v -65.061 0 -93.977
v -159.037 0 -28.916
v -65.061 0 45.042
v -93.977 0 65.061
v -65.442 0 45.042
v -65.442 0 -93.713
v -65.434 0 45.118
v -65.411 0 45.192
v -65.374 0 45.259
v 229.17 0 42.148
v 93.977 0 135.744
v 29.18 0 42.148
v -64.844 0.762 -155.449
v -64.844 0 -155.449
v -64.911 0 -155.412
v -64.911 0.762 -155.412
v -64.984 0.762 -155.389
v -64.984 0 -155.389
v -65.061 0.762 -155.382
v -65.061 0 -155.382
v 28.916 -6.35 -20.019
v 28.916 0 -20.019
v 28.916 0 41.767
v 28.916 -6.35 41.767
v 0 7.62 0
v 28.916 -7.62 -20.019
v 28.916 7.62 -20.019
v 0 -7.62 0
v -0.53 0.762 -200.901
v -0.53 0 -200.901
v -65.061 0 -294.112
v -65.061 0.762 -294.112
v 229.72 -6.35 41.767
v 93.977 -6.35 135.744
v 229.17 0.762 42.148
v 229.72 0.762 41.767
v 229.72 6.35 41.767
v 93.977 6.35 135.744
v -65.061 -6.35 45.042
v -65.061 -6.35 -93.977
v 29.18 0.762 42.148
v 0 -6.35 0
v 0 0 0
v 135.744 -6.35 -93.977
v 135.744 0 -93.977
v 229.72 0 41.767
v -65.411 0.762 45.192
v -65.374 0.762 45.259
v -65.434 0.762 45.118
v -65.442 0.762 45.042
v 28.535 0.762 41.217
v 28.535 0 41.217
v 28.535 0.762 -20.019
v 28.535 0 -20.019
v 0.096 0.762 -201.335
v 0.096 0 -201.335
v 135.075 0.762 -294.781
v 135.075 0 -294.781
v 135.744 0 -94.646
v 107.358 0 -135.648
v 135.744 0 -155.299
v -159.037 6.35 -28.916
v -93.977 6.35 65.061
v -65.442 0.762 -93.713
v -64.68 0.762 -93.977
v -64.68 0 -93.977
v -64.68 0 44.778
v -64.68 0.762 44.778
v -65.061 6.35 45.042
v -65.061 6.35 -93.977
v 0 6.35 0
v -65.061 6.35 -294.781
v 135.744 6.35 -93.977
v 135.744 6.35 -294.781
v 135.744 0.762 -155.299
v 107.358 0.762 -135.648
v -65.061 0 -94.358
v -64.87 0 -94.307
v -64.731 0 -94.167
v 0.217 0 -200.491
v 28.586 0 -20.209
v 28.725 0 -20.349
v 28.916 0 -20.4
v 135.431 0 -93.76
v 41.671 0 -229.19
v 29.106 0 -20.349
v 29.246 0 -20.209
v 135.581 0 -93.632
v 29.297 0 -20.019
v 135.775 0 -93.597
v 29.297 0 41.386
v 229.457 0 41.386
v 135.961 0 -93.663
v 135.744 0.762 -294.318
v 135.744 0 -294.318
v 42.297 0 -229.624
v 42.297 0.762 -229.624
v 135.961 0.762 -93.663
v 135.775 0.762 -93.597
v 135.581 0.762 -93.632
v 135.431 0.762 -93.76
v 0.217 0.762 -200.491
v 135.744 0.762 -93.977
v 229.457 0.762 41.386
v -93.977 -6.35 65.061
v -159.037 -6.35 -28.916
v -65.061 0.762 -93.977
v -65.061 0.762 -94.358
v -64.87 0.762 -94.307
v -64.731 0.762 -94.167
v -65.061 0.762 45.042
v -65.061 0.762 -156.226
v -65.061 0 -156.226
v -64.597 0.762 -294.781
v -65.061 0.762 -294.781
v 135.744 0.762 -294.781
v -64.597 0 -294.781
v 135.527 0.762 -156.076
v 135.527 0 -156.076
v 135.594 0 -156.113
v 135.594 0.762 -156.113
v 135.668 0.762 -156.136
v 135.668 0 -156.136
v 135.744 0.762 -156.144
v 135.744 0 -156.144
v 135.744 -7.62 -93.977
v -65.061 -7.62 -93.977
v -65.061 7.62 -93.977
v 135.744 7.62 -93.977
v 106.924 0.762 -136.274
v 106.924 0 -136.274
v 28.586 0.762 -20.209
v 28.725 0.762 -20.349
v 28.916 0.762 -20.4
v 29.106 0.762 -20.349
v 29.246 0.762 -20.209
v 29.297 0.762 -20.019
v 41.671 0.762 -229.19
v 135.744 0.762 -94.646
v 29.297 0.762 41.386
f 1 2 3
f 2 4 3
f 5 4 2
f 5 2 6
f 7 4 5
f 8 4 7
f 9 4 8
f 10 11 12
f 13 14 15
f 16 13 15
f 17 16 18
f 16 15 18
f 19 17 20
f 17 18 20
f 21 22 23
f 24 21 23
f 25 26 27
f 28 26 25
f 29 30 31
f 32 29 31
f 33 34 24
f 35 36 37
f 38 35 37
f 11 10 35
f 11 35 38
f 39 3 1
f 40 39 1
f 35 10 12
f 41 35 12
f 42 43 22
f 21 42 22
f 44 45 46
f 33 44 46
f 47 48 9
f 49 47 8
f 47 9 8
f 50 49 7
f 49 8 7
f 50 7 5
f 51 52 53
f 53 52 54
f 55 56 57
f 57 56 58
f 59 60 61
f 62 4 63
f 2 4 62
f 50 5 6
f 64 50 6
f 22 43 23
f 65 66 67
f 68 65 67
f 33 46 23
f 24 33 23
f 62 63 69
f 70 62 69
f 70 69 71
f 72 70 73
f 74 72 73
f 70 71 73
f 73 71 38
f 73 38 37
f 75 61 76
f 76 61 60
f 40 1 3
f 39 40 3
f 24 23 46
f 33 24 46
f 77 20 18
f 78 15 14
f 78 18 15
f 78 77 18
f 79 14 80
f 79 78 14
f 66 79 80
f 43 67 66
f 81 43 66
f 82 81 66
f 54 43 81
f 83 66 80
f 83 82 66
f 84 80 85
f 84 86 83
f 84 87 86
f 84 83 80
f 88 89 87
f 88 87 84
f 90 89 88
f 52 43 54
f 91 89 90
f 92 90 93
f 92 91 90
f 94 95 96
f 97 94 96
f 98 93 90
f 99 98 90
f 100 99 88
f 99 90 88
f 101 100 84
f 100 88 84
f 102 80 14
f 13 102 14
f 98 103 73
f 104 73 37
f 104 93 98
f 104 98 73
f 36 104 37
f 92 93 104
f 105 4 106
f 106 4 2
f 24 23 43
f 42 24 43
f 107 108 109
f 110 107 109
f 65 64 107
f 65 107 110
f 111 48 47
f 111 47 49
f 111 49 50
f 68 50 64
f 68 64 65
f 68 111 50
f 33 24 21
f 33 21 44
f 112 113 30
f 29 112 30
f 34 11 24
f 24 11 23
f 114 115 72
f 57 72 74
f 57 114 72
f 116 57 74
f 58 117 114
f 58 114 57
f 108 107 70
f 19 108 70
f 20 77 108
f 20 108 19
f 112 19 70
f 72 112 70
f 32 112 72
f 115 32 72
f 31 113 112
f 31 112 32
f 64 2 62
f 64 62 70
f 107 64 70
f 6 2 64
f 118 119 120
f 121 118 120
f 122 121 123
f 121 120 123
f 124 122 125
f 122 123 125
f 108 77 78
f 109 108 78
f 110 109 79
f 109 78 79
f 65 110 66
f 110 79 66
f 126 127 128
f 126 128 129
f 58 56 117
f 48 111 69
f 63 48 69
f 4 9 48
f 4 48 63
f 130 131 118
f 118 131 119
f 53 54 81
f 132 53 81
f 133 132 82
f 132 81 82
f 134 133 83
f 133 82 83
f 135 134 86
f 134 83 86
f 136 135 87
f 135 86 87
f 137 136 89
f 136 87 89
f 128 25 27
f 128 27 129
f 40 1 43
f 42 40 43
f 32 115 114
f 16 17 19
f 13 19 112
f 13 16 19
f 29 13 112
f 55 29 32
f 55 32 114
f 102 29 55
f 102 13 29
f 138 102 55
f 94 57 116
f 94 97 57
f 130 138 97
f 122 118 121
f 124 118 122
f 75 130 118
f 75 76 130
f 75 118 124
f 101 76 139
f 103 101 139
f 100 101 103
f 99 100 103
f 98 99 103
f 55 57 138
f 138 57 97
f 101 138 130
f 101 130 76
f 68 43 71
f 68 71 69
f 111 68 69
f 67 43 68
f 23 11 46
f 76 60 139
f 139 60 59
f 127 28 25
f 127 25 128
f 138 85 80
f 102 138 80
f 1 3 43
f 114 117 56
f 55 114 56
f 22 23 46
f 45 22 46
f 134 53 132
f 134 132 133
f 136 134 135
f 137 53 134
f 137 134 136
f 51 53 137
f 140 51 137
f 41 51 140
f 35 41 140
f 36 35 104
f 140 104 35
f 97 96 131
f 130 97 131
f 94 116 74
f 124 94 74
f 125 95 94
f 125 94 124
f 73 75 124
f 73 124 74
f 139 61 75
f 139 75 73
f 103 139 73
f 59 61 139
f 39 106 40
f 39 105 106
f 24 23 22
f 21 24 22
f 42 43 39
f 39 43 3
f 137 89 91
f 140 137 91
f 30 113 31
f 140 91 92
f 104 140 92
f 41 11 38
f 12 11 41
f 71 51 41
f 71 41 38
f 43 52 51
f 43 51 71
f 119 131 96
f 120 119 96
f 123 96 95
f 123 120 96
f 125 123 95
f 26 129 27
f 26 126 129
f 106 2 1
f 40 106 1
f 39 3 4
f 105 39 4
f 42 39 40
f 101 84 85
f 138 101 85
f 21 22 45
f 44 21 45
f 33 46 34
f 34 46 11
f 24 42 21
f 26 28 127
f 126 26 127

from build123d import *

# Parameters (mm, degrees)
F1_DEPTH = 7.62
F2_DEPTH = 6.35
F3_DEPTH = 6.35
F4_DEPTH = 6.35
F6_DEPTH = 0.762


with BuildPart() as f1:
    # F0 (on Front) → F1 (new body, symmetric)
    with BuildSketch(Plane.XZ):
        Polygon((28.9158669246, -20.0186771016), (0, 0), (-65.0607005803, -93.9765675049), (135.7439308404, -93.9765675049), align=None)
    extrude(amount=F1_DEPTH, both=True)


with BuildPart() as f2:
    # F0 (on Front) → F2 (new body)
    with BuildSketch(Plane.XZ):
        Polygon((28.9158669246, 41.7673633355), (28.9158669246, -20.0186771016), (135.7439308404, -93.9765675049), (229.7204983453, 41.7673633355), align=None)
    extrude(amount=F2_DEPTH)


with BuildPart() as f2b:
    # F0 (on Front) → F2, piece 2 (new body)
    with BuildSketch(Plane.XZ):
        Polygon((-65.0607005803, -93.9765675049), (0, 0), (-65.0607005803, 45.0420234787), align=None)
    extrude(amount=F2_DEPTH)


with BuildPart() as f3:
    # F0 (on Front) → F3 (new body)
    with BuildSketch(Plane.XZ):
        Polygon((93.9765675049, 135.7439308404), (28.9158669246, 41.7673633355), (229.7204983453, 41.7673633355), align=None)
    extrude(amount=F3_DEPTH)


with BuildPart() as f3b:
    # F0 (on Front) → F3, piece 2 (new body)
    with BuildSketch(Plane.XZ):
        Polygon((-159.0372680852, -28.9158669246), (-65.0607005803, -93.9765675049), (-65.0607005803, 45.0420234787), (-93.9765675049, 65.0607005803), align=None)
    extrude(amount=F3_DEPTH)


with BuildPart() as f3c:
    # F0 (on Front) → F3, piece 3 (new body)
    with BuildSketch(Plane.XZ):
        Polygon((28.9158669246, 41.7673633355), (0, 0), (28.9158669246, -20.0186771016), align=None)
    extrude(amount=F3_DEPTH)


with BuildPart() as f4:
    # F0 (on Front) → F4 (new body)
    with BuildSketch(Plane.XZ):
        Polygon((28.9158669246, -20.0186771016), (0, 0), (-65.0607005803, -93.9765675049), (135.7439308404, -93.9765675049), align=None)
        Polygon((28.9158669246, 41.7673633355), (0, 0), (28.9158669246, -20.0186771016), align=None)
        Polygon((-65.0607005803, -93.9765675049), (0, 0), (-65.0607005803, 45.0420234787), align=None)
        Polygon((135.7439308404, -93.9765675049), (-65.0607005803, -93.9765675049), (-65.0607005803, -155.762607942), (0, -200.8046314207), (41.7673633355, -229.7204983453), (106.8280639158, -135.7439308404), align=None)
        Polygon((-159.0372680852, -28.9158669246), (-65.0607005803, -93.9765675049), (-65.0607005803, 45.0420234787), (-93.9765675049, 65.0607005803), align=None)
        Polygon((28.9158669246, 41.7673633355), (28.9158669246, -20.0186771016), (135.7439308404, -93.9765675049), (229.7204983453, 41.7673633355), align=None)
        Polygon((93.9765675049, 135.7439308404), (28.9158669246, 41.7673633355), (229.7204983453, 41.7673633355), align=None)
        Polygon((135.7439308404, -155.762607942), (135.7439308404, -93.9765675049), (106.8280639158, -135.7439308404), align=None)
        Polygon((0, -200.8046314207), (-65.0607005803, -155.762607942), (-65.0607005803, -294.7811989256), align=None)
        Polygon((135.7439308404, -294.7811989256), (135.7439308404, -155.762607942), (106.8280639158, -135.7439308404), (41.7673633355, -229.7204983453), align=None)
        Polygon((0, -200.8046314207), (-65.0607005803, -294.7811989256), (135.7439308404, -294.7811989256), (41.7673633355, -229.7204983453), align=None)
    extrude(amount=-F4_DEPTH)

    # F5 (on face) → F6 (cut)
    with BuildSketch(Plane.XZ):
        with BuildLine():
            ThreePointArc((-64.8438315784, -155.449352717), (-65.3739558053, -155.5457389401), (-65.2775695822, -156.075863167))
            Line((-65.2775695822, -156.075863167), (-0.530124227, -200.9010176438))
            Line((-0.530124227, -200.9010176438), (-0.313255225, -200.5877624188))
            ThreePointArc((-0.313255225, -200.5877624188), (-0.0681555046, -200.4297770127), (0.2168687468, -200.491376019))
            Line((0.2168687468, -200.491376019), (-64.8438315784, -155.449352717))
        make_face()
        with BuildLine():
            Line((-0.313255225, -200.5877624188), (-0.530124227, -200.9010176438))
            Line((-0.530124227, -200.9010176438), (0.0963862231, -201.3347556476))
            Line((0.0963862231, -201.3347556476), (0.313255225, -201.0215004226))
            ThreePointArc((0.313255225, -201.0215004226), (0.374854408, -200.7364759161), (0.2168687468, -200.491376019))
            ThreePointArc((0.2168687468, -200.491376019), (-0.0681555046, -200.4297770127), (-0.313255225, -200.5877624188))
        make_face()
        with BuildLine():
            Line((0.0963862231, -201.3347556476), (-0.530124227, -200.9010176438))
            Line((-0.530124227, -200.9010176438), (-65.3739558053, -294.5643299236))
            ThreePointArc((-65.3739558053, -294.5643299236), (-65.2775695822, -295.0944541506), (-64.7474453553, -294.9980679275))
            Line((-64.7474453553, -294.9980679275), (0.0963862231, -201.3347556476))
        make_face()
        with BuildLine():
            Line((41.6709771124, -229.1903741183), (0.2168687468, -200.491376019))
            ThreePointArc((0.2168687468, -200.491376019), (0.374854408, -200.7364759161), (0.313255225, -201.0215004226))
            Line((0.313255225, -201.0215004226), (0.0963862231, -201.3347556476))
            Line((0.0963862231, -201.3347556476), (41.5504944163, -230.0337536275))
            ThreePointArc((41.5504944163, -230.0337536275), (41.3925089088, -229.7886537467), (41.4541081105, -229.5036293433))
            Line((41.4541081105, -229.5036293433), (41.6709771124, -229.1903741183))
        make_face()
        with BuildLine():
            Line((106.5148086859, -135.5270618455), (41.6709771124, -229.1903741183))
            Line((41.6709771124, -229.1903741183), (42.2974875625, -229.6241121222))
            Line((42.2974875625, -229.6241121222), (106.9244501389, -136.2740550673))
            Line((106.9244501389, -136.2740550673), (106.6111949139, -136.0571860654))
            ThreePointArc((106.6111949139, -136.0571860654), (106.4532094808, -135.8120861966), (106.5148086859, -135.5270618455))
        make_face()
        with BuildLine():
            Line((42.2974875625, -229.6241121222), (41.6709771124, -229.1903741183))
            Line((41.6709771124, -229.1903741183), (41.4541081105, -229.5036293433))
            ThreePointArc((41.4541081105, -229.5036293433), (41.3925089088, -229.7886537467), (41.5504944163, -230.0337536275))
            ThreePointArc((41.5504944163, -230.0337536275), (41.8355187369, -230.095352772), (42.0806185605, -229.9373673472))
            Line((42.0806185605, -229.9373673472), (42.2974875625, -229.6241121222))
        make_face()
        with BuildLine():
            ThreePointArc((42.0806185605, -229.9373673472), (41.8355187369, -230.095352772), (41.5504944163, -230.0337536275))
            Line((41.5504944163, -230.0337536275), (135.5270618385, -295.0944541506))
            ThreePointArc((135.5270618385, -295.0944541506), (136.0571860654, -294.9980679275), (135.9607998423, -294.4679437006))
            Line((135.9607998423, -294.4679437006), (42.2974875625, -229.6241121222))
            Line((42.2974875625, -229.6241121222), (42.0806185605, -229.9373673472))
        make_face()
        with BuildLine():
            ThreePointArc((107.0449329177, -135.4306756154), (106.7599085596, -135.3690764054), (106.5148086859, -135.5270618455))
            ThreePointArc((106.5148086859, -135.5270618455), (106.4532094808, -135.8120861966), (106.6111949139, -136.0571860654))
            Line((106.6111949139, -136.0571860654), (106.9244501389, -136.2740550673))
            Line((106.9244501389, -136.2740550673), (107.3581881428, -135.6475446173))
            Line((107.3581881428, -135.6475446173), (107.0449329177, -135.4306756154))
        make_face()
        with BuildLine():
            Line((135.4306756154, -93.7596985029), (106.5148086859, -135.5270618455))
            ThreePointArc((106.5148086859, -135.5270618455), (106.7599085596, -135.3690764054), (107.0449329177, -135.4306756154))
            Line((107.0449329177, -135.4306756154), (107.3581881428, -135.6475446173))
            Line((107.3581881428, -135.6475446173), (136.0571860654, -94.1934365068))
            ThreePointArc((136.0571860654, -94.1934365068), (135.9607998423, -93.6633122799), (135.4306756154, -93.7596985029))
        make_face()
        with BuildLine():
            Line((107.3581881428, -135.6475446173), (106.9244501389, -136.2740550673))
            Line((106.9244501389, -136.2740550673), (135.5270618385, -156.075863167))
            ThreePointArc((135.5270618385, -156.075863167), (136.0571860654, -155.979476944), (135.9607998423, -155.449352717))
            Line((135.9607998423, -155.449352717), (107.3581881428, -135.6475446173))
        make_face()
        with BuildLine():
            ThreePointArc((-65.4417005803, -93.9765675049), (-65.0607005803, -94.3575675049), (-64.6797005803, -93.9765675049))
            Line((-64.6797005803, -93.9765675049), (-64.6797005803, 45.0420234787))
            ThreePointArc((-64.6797005803, 45.0420234787), (-65.0607005803, 45.4230234787), (-65.4417005803, 45.0420234787))
            Line((-65.4417005803, 45.0420234787), (-65.4417005803, -93.9765675049))
        make_face()
        with BuildLine():
            ThreePointArc((28.9158669246, 41.3863633355), (28.6464592409, 41.4979556519), (28.5348669246, 41.7673633355))
            Line((28.5348669246, 41.7673633355), (28.5348669246, -20.0186771016))
            ThreePointArc((28.5348669246, -20.0186771016), (28.9158669246, -20.3996771016), (29.2968669246, -20.0186771016))
            Line((29.2968669246, -20.0186771016), (29.2968669246, 41.3863633355))
            Line((29.2968669246, 41.3863633355), (28.9158669246, 41.3863633355))
        make_face()
        with BuildLine():
            ThreePointArc((28.9158669246, 42.1483633355), (28.6464592409, 42.0367710191), (28.5348669246, 41.7673633355))
            ThreePointArc((28.5348669246, 41.7673633355), (28.6464592409, 41.4979556519), (28.9158669246, 41.3863633355))
            Line((28.9158669246, 41.3863633355), (29.2968669246, 41.3863633355))
            Line((29.2968669246, 41.3863633355), (29.2968669246, 41.7673633355))
            ThreePointArc((29.2968669246, 41.7673633355), (29.1852746082, 42.0367710191), (28.9158669246, 42.1483633355))
        make_face()
        with BuildLine():
            Line((229.7204983453, 42.1483633355), (28.9158669246, 42.1483633355))
            ThreePointArc((28.9158669246, 42.1483633355), (29.1852746082, 42.0367710191), (29.2968669246, 41.7673633355))
            Line((29.2968669246, 41.7673633355), (29.2968669246, 41.3863633355))
            Line((29.2968669246, 41.3863633355), (229.7204983453, 41.3863633355))
            ThreePointArc((229.7204983453, 41.3863633355), (230.1014983453, 41.7673633355), (229.7204983453, 42.1483633355))
        make_face()
    extrude(amount=-F6_DEPTH, mode=Mode.SUBTRACT)


solid = Compound([f1.part, f2.part, f2b.part, f3.part, f3b.part, f3c.part, f4.part])
